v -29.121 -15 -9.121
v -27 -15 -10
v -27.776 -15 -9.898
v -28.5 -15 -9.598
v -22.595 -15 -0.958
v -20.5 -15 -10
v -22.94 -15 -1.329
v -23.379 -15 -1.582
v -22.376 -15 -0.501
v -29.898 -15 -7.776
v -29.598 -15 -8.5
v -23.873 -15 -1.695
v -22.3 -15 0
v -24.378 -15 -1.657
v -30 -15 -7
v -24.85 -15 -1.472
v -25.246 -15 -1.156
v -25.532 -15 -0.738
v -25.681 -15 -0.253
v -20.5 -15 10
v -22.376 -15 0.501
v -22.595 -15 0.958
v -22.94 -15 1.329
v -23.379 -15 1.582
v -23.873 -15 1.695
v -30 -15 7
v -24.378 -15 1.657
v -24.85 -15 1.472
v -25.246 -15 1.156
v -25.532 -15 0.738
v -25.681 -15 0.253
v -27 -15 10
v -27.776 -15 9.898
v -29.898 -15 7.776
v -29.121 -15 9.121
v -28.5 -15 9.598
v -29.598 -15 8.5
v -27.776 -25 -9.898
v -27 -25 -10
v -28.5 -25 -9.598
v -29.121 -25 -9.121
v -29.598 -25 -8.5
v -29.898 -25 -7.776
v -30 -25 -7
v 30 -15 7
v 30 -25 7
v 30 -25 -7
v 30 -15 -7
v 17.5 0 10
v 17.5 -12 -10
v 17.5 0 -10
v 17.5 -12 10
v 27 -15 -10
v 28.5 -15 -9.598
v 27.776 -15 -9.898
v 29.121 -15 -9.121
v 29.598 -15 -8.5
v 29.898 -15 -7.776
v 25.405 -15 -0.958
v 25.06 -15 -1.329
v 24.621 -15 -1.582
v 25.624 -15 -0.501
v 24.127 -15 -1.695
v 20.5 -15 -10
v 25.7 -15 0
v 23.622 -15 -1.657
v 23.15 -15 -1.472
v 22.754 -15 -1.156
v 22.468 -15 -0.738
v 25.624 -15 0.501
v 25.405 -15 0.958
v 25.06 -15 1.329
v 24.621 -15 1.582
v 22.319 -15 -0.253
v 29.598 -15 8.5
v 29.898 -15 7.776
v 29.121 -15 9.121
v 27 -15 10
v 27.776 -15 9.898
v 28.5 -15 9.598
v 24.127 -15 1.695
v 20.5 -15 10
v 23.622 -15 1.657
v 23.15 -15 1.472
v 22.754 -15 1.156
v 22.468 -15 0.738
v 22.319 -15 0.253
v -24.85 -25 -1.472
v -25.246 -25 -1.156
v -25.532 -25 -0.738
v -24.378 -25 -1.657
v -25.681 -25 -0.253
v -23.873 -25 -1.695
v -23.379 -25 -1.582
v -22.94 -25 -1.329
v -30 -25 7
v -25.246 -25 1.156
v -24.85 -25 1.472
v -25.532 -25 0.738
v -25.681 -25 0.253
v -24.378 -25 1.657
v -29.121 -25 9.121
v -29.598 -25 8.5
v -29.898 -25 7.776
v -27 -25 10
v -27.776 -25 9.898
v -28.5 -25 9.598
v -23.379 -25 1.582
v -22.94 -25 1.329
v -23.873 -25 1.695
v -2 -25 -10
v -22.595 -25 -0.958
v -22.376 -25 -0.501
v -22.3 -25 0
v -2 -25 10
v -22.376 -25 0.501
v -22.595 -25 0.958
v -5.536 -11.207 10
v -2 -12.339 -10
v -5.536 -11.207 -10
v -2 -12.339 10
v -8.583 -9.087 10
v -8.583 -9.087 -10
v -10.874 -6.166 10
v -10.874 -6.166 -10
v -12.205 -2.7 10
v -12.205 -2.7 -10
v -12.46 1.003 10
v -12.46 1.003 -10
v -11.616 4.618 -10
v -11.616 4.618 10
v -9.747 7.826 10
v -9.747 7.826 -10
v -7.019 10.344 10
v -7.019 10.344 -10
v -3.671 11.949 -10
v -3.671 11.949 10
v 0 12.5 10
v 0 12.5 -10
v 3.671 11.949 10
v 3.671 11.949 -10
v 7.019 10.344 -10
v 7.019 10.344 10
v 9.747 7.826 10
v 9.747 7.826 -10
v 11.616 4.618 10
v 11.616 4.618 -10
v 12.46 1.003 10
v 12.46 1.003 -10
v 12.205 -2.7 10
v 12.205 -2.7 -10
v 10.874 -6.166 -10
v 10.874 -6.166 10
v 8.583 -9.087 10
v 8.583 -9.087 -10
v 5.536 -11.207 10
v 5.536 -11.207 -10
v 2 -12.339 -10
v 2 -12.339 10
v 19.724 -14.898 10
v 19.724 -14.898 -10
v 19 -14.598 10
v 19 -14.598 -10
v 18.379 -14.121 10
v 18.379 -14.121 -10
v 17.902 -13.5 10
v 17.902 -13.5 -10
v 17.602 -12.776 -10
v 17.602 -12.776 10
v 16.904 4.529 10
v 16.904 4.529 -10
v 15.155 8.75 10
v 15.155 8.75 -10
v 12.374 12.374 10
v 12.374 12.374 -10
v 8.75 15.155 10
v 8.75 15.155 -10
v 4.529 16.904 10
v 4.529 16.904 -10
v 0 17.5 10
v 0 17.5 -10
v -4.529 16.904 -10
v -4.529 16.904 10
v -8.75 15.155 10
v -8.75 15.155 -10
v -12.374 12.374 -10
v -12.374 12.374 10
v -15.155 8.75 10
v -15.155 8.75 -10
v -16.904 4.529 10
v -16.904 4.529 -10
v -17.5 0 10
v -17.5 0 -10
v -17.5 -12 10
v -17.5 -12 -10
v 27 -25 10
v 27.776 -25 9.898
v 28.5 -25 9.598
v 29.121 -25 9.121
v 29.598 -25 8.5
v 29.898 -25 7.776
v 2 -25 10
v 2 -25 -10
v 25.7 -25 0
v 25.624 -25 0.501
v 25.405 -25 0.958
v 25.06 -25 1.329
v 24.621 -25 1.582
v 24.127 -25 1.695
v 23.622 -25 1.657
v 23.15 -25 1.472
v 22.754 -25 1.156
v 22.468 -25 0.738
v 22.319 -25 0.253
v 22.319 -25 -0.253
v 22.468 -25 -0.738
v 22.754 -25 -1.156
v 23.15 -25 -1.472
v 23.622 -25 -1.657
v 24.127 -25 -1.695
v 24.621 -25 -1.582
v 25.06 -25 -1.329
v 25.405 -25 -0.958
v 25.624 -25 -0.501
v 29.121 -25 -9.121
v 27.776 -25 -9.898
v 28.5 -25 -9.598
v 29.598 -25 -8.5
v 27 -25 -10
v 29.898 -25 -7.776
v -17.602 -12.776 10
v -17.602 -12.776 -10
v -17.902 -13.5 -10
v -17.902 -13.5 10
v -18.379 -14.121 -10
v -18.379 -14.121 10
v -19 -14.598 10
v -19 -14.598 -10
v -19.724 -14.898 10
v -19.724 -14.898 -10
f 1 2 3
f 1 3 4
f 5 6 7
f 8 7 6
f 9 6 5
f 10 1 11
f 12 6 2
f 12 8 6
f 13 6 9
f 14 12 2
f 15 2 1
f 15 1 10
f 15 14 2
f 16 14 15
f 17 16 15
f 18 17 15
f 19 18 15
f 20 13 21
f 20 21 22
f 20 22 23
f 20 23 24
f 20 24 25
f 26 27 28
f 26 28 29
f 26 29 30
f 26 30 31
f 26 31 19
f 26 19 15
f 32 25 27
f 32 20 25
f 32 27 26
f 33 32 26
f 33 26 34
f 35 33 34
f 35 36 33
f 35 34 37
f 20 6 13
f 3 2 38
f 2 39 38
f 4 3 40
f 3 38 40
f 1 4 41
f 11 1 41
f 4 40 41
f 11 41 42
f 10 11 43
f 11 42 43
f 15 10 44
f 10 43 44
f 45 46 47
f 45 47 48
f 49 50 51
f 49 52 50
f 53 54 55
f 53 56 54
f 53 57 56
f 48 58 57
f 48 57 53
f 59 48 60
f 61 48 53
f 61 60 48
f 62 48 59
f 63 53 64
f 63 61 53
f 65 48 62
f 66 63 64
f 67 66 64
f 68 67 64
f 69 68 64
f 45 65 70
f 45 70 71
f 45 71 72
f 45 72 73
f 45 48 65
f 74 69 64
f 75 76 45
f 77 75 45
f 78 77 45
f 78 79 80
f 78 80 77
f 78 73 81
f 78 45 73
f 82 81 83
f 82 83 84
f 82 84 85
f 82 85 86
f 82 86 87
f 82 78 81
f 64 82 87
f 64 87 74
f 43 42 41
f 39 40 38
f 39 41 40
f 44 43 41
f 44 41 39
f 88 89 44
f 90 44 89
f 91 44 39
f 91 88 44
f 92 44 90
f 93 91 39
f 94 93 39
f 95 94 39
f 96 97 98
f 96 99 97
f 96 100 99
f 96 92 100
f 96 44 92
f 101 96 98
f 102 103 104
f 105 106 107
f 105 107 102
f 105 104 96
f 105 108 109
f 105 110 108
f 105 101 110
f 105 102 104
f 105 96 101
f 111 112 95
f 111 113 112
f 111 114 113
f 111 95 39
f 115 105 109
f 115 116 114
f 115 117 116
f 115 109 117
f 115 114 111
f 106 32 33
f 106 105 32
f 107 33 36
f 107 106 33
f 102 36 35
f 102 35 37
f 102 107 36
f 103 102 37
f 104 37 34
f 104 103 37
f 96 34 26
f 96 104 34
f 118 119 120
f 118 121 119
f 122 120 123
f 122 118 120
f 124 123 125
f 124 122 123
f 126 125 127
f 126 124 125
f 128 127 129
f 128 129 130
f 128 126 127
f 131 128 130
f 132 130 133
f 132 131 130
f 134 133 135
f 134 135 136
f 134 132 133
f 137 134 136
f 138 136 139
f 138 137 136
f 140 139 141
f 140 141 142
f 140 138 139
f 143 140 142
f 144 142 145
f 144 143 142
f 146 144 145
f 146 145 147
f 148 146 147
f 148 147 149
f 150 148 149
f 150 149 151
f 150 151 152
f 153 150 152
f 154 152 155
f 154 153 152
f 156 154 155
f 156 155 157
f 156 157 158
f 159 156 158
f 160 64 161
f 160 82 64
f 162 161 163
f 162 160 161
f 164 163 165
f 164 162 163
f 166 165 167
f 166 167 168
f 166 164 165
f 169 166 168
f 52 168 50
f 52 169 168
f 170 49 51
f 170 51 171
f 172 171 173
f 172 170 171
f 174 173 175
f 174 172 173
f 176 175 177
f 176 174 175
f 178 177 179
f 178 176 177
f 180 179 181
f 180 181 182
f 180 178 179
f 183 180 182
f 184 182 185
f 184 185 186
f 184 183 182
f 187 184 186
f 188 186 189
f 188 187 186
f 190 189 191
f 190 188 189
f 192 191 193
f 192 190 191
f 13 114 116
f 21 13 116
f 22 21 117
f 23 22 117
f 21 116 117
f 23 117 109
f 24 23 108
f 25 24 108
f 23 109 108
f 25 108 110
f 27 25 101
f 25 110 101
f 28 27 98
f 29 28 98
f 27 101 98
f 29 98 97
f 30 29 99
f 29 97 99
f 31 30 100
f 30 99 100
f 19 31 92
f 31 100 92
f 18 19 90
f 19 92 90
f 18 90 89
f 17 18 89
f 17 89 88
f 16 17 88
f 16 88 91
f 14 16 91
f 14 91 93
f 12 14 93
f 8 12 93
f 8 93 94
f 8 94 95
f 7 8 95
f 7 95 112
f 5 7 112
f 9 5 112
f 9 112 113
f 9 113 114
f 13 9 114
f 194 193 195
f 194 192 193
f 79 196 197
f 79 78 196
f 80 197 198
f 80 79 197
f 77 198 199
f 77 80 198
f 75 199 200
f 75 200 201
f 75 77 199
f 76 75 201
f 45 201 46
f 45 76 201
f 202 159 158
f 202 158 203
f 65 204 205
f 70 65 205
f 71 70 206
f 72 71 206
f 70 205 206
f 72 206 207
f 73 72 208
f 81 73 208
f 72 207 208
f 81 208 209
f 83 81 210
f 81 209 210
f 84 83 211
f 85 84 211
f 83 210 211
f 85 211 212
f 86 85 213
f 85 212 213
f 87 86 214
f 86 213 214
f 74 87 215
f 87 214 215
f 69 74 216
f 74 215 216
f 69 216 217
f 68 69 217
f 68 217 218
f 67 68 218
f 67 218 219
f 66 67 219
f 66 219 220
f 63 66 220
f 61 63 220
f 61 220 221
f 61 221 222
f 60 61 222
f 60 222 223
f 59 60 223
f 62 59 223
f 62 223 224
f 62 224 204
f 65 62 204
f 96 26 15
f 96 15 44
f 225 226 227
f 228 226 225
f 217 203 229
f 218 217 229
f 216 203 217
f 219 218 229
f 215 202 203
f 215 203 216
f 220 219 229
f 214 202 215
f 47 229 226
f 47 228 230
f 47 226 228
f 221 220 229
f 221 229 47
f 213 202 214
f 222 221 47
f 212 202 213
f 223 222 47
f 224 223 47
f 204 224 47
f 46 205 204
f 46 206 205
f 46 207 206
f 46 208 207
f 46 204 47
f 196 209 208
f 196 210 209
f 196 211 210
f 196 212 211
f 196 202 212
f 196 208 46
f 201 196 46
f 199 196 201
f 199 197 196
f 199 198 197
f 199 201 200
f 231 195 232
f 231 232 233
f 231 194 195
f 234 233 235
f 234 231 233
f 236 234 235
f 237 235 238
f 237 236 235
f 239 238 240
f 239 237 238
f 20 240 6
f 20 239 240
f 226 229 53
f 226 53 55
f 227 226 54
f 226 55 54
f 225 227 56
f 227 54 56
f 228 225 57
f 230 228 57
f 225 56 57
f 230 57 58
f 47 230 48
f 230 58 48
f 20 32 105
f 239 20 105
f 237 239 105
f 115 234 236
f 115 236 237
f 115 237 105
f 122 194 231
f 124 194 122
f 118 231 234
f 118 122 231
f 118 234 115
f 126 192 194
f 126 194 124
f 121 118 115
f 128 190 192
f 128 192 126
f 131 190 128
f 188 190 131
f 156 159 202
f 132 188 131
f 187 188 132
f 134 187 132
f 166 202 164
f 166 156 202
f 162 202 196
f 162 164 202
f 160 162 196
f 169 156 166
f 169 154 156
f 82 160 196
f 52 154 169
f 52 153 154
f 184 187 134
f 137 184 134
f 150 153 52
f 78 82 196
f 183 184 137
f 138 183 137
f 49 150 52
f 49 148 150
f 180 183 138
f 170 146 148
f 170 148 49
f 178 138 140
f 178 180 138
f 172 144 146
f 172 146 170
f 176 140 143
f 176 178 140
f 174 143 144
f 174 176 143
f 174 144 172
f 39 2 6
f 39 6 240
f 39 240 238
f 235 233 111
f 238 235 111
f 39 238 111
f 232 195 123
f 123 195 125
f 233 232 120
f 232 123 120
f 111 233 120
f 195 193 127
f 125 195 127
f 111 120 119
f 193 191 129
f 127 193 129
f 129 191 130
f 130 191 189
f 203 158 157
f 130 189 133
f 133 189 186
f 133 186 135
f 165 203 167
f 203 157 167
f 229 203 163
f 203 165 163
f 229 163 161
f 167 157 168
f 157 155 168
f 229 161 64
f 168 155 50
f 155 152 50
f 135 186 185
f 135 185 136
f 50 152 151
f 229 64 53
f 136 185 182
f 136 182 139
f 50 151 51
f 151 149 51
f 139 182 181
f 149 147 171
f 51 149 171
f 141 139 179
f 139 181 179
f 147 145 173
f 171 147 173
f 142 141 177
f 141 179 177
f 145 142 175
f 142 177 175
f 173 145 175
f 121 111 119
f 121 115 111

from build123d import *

# Parameters (mm, degrees)
F1_DEPTH = 10
F3_D     = 3.4
F4_R     = 3


with BuildPart() as f1:
    # F0 (on Top) → F1 (new body, symmetric)
    with BuildSketch(Plane.XY):
        with BuildLine():
            ThreePointArc((-2, -12.338963), (0, 12.5), (2, -12.338963))
            Line((2, -12.338963), (2, -25))
            Line((2, -25), (30, -25))
            Line((30, -25), (30, -15))
            Line((30, -15), (17.5, -15))
            Line((17.5, -15), (17.5, 0))
            ThreePointArc((17.5, 0), (0, 17.5), (-17.5, 0))
            Line((-17.5, 0), (-17.5, -15))
            Line((-17.5, -15), (-30, -15))
            Line((-30, -15), (-30, -25))
            Line((-30, -25), (-2, -25))
            Line((-2, -25), (-2, -12.338963))
        make_face()
    extrude(amount=F1_DEPTH, both=True)

    # F3 (through all)
    with Locations(Plane(origin=(0, -15, 0), x_dir=(-1, 0, 0), z_dir=(0, 1, 0))):
        with Locations((24, 0), (-24, 0)):
            Hole(F3_D / 2)

    # F4
    f4_edges = [f1.edges().sort_by_distance(p)[0] for p in [
        (17.5, -15, 0),
        (-17.5, -15, 0),
        (-30, -20, 10),
        (-30, -20, -10),
        (30, -20, 10),
        (30, -20, -10),
    ]]
    fillet(f4_edges, radius=F4_R)


solid = f1.part
